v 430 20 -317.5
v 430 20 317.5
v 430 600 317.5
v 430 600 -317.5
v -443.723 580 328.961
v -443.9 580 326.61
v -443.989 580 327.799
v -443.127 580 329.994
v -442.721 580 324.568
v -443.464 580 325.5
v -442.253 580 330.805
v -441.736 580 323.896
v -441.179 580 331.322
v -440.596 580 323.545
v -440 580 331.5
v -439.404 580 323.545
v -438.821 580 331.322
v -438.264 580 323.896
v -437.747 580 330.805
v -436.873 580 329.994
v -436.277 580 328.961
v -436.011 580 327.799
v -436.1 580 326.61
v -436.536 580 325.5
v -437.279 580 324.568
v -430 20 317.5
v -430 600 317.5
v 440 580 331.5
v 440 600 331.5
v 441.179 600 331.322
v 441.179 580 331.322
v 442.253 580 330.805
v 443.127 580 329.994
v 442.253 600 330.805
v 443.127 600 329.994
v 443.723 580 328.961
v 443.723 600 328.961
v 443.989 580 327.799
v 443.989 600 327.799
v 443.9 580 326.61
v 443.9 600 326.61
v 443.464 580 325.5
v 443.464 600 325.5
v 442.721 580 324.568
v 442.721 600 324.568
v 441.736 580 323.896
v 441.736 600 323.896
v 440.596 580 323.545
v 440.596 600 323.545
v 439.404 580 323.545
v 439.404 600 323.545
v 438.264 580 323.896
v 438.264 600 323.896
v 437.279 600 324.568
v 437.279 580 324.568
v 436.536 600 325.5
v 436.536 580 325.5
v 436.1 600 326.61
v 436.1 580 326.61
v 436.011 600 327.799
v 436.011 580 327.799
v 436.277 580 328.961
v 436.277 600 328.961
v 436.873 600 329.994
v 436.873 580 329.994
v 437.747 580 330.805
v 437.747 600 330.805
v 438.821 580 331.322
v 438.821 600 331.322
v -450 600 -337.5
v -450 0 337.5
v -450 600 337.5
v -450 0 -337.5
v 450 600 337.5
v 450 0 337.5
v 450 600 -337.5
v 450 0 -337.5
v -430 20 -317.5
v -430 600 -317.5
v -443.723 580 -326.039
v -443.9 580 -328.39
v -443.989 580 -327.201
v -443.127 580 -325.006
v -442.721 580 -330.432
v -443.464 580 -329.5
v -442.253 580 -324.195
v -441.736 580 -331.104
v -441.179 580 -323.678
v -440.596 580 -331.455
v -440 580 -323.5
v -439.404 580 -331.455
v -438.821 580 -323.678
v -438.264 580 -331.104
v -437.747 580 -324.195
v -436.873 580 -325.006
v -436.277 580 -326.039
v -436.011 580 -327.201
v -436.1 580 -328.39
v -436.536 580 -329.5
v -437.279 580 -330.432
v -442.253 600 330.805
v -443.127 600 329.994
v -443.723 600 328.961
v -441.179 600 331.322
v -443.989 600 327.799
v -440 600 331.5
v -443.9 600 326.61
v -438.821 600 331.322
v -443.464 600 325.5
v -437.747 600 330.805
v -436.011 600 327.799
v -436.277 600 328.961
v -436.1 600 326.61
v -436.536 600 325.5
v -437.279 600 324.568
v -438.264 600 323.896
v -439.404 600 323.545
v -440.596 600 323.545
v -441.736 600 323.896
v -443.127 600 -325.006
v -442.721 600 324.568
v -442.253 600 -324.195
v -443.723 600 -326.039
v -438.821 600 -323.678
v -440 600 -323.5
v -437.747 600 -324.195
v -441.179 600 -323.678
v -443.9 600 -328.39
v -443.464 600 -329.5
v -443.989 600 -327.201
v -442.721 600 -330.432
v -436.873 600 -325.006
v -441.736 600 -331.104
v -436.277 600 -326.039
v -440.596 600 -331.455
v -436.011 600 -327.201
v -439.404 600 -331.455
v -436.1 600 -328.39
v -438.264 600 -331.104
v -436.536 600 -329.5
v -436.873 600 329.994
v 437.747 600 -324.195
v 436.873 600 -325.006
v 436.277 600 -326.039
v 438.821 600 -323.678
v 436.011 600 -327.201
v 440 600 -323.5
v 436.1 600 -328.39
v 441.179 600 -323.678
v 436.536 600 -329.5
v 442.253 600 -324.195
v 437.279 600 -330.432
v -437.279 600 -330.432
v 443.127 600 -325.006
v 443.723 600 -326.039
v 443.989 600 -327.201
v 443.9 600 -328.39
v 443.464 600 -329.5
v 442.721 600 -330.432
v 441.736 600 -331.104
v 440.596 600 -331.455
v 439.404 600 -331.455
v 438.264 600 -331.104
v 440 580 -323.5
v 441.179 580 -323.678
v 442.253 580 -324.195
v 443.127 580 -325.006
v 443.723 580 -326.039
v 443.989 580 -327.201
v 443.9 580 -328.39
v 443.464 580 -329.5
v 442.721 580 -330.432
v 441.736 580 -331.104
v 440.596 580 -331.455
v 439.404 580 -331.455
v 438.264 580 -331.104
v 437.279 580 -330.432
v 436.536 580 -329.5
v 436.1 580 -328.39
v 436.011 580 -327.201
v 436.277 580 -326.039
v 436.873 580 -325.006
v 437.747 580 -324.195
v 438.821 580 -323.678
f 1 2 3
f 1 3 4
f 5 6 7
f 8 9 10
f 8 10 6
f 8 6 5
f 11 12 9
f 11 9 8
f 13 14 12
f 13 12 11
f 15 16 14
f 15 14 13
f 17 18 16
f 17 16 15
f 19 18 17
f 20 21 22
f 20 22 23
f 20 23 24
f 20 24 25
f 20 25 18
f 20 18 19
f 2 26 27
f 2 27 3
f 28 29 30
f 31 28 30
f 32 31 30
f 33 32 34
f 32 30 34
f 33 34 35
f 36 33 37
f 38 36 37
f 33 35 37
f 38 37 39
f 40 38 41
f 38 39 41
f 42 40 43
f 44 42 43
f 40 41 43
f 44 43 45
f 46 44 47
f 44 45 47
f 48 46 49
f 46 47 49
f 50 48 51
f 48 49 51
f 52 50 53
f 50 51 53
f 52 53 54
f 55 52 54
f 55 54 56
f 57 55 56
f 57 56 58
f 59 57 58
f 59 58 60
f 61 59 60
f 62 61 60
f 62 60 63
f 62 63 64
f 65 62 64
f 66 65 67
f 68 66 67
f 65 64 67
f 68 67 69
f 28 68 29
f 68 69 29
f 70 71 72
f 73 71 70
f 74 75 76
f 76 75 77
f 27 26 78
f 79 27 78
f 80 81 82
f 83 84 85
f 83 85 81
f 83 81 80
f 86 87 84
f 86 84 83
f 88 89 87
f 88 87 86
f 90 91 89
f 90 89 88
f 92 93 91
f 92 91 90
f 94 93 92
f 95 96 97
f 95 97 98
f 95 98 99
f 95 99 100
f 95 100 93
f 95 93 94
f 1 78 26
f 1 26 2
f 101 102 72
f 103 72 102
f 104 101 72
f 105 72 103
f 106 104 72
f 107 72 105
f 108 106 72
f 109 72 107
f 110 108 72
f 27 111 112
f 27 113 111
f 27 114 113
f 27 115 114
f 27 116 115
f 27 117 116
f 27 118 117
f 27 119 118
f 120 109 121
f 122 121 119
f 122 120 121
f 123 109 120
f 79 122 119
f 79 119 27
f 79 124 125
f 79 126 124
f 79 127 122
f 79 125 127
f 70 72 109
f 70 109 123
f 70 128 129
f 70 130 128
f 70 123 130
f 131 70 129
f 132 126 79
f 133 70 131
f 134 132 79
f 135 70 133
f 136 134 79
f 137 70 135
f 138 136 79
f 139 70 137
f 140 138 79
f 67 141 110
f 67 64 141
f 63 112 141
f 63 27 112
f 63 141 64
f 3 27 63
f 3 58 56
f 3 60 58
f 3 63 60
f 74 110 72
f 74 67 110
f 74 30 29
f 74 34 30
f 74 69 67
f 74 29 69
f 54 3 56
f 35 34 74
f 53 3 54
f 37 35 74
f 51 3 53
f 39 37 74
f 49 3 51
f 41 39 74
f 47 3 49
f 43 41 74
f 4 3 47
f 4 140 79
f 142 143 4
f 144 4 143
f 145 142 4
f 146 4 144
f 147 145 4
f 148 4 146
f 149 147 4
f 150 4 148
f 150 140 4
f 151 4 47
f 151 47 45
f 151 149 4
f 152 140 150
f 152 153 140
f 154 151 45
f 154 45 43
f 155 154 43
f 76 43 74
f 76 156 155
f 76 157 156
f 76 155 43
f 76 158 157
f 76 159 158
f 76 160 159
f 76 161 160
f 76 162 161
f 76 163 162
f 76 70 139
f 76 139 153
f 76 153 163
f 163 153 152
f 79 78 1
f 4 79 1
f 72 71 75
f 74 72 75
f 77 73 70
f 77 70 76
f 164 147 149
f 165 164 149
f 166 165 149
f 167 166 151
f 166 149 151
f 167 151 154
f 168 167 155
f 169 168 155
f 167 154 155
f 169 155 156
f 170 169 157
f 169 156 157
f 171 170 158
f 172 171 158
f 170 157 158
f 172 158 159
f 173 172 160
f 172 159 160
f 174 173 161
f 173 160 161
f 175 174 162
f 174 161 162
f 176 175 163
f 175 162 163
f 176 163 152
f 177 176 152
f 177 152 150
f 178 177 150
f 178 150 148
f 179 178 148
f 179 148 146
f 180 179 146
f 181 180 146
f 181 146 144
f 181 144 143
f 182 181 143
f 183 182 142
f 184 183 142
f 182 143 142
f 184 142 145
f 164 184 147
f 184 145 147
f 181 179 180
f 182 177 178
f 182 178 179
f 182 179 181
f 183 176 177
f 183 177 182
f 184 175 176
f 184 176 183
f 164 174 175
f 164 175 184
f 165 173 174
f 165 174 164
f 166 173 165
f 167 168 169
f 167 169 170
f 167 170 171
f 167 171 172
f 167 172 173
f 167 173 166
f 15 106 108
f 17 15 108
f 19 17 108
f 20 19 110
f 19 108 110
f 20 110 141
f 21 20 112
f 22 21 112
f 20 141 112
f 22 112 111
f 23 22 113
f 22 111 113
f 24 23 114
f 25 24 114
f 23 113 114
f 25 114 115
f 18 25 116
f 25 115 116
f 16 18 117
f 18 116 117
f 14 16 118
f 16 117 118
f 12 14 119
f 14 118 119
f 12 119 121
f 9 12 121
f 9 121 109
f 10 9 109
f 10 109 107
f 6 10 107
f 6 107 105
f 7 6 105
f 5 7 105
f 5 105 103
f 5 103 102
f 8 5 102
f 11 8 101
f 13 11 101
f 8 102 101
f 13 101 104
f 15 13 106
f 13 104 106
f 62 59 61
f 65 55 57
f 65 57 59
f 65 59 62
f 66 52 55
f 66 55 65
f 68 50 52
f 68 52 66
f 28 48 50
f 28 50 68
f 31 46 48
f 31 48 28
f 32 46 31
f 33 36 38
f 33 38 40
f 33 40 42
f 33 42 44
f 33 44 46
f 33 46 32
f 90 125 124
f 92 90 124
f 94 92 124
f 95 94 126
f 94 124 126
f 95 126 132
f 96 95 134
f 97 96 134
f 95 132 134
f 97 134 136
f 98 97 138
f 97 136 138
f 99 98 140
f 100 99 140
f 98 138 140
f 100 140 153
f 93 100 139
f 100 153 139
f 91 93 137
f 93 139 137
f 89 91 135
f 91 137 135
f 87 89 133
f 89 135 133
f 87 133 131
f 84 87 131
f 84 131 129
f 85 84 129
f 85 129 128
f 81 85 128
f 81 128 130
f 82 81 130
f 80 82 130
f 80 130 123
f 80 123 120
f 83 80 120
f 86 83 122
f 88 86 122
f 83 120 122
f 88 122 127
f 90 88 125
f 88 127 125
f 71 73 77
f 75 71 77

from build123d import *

# Parameters (mm, degrees)
SKETCH1_W           = 900
SKETCH1_H           = 675
BOSS_EXTRUDE1_DEPTH = 600
SHELL1_T            = -20
SKETCH5_R           = 4
CUT_EXTRUDE1_DEPTH  = 20
SKETCH6_R           = 4
CUT_EXTRUDE2_DEPTH  = 20
SKETCH7_R           = 4
CUT_EXTRUDE3_DEPTH  = 20
SKETCH8_R           = 4
CUT_EXTRUDE4_DEPTH  = 20


with BuildPart() as part:
    # Sketch1 → Boss-Extrude1 (new body)
    with BuildSketch(Plane(origin=(0, 0, 0), x_dir=(1, 0, 0), z_dir=(0, 1, 0))):
        Rectangle(SKETCH1_W, SKETCH1_H)
    extrude(amount=BOSS_EXTRUDE1_DEPTH)

    # Shell1
    shell1_openings = [part.faces().sort_by_distance(p)[0] for p in [
        (0, 600, 0),
    ]]
    offset(amount=SHELL1_T, openings=shell1_openings, kind=Kind.INTERSECTION)

    # Sketch5 → Cut-Extrude1 (cut)
    with BuildSketch(Plane(origin=(0, 600, 0), x_dir=(1, 0, 0), z_dir=(0, 1, 0))):
        with Locations(Location((-440, -327.5, 0), (0, 0, 270))):
            Circle(SKETCH5_R)
    extrude(amount=-CUT_EXTRUDE1_DEPTH, mode=Mode.SUBTRACT)

    # Sketch6 → Cut-Extrude2 (cut)
    with BuildSketch(Plane(origin=(0, 600, 0), x_dir=(1, 0, 0), z_dir=(0, 1, 0))):
        with Locations(Location((440, -327.5, 0), (0, 0, 270))):
            Circle(SKETCH6_R)
    extrude(amount=-CUT_EXTRUDE2_DEPTH, mode=Mode.SUBTRACT)

    # Sketch7 → Cut-Extrude3 (cut)
    with BuildSketch(Plane(origin=(0, 600, 0), x_dir=(1, 0, 0), z_dir=(0, 1, 0))):
        with Locations(Location((440, 327.5, 0), (0, 0, 270))):
            Circle(SKETCH7_R)
    extrude(amount=-CUT_EXTRUDE3_DEPTH, mode=Mode.SUBTRACT)

    # Sketch8 → Cut-Extrude4 (cut)
    with BuildSketch(Plane(origin=(0, 600, 0), x_dir=(1, 0, 0), z_dir=(0, 1, 0))):
        with Locations(Location((-440, 327.5, 0), (0, 0, 270))):
            Circle(SKETCH8_R)
    extrude(amount=-CUT_EXTRUDE4_DEPTH, mode=Mode.SUBTRACT)


solid = part.part
